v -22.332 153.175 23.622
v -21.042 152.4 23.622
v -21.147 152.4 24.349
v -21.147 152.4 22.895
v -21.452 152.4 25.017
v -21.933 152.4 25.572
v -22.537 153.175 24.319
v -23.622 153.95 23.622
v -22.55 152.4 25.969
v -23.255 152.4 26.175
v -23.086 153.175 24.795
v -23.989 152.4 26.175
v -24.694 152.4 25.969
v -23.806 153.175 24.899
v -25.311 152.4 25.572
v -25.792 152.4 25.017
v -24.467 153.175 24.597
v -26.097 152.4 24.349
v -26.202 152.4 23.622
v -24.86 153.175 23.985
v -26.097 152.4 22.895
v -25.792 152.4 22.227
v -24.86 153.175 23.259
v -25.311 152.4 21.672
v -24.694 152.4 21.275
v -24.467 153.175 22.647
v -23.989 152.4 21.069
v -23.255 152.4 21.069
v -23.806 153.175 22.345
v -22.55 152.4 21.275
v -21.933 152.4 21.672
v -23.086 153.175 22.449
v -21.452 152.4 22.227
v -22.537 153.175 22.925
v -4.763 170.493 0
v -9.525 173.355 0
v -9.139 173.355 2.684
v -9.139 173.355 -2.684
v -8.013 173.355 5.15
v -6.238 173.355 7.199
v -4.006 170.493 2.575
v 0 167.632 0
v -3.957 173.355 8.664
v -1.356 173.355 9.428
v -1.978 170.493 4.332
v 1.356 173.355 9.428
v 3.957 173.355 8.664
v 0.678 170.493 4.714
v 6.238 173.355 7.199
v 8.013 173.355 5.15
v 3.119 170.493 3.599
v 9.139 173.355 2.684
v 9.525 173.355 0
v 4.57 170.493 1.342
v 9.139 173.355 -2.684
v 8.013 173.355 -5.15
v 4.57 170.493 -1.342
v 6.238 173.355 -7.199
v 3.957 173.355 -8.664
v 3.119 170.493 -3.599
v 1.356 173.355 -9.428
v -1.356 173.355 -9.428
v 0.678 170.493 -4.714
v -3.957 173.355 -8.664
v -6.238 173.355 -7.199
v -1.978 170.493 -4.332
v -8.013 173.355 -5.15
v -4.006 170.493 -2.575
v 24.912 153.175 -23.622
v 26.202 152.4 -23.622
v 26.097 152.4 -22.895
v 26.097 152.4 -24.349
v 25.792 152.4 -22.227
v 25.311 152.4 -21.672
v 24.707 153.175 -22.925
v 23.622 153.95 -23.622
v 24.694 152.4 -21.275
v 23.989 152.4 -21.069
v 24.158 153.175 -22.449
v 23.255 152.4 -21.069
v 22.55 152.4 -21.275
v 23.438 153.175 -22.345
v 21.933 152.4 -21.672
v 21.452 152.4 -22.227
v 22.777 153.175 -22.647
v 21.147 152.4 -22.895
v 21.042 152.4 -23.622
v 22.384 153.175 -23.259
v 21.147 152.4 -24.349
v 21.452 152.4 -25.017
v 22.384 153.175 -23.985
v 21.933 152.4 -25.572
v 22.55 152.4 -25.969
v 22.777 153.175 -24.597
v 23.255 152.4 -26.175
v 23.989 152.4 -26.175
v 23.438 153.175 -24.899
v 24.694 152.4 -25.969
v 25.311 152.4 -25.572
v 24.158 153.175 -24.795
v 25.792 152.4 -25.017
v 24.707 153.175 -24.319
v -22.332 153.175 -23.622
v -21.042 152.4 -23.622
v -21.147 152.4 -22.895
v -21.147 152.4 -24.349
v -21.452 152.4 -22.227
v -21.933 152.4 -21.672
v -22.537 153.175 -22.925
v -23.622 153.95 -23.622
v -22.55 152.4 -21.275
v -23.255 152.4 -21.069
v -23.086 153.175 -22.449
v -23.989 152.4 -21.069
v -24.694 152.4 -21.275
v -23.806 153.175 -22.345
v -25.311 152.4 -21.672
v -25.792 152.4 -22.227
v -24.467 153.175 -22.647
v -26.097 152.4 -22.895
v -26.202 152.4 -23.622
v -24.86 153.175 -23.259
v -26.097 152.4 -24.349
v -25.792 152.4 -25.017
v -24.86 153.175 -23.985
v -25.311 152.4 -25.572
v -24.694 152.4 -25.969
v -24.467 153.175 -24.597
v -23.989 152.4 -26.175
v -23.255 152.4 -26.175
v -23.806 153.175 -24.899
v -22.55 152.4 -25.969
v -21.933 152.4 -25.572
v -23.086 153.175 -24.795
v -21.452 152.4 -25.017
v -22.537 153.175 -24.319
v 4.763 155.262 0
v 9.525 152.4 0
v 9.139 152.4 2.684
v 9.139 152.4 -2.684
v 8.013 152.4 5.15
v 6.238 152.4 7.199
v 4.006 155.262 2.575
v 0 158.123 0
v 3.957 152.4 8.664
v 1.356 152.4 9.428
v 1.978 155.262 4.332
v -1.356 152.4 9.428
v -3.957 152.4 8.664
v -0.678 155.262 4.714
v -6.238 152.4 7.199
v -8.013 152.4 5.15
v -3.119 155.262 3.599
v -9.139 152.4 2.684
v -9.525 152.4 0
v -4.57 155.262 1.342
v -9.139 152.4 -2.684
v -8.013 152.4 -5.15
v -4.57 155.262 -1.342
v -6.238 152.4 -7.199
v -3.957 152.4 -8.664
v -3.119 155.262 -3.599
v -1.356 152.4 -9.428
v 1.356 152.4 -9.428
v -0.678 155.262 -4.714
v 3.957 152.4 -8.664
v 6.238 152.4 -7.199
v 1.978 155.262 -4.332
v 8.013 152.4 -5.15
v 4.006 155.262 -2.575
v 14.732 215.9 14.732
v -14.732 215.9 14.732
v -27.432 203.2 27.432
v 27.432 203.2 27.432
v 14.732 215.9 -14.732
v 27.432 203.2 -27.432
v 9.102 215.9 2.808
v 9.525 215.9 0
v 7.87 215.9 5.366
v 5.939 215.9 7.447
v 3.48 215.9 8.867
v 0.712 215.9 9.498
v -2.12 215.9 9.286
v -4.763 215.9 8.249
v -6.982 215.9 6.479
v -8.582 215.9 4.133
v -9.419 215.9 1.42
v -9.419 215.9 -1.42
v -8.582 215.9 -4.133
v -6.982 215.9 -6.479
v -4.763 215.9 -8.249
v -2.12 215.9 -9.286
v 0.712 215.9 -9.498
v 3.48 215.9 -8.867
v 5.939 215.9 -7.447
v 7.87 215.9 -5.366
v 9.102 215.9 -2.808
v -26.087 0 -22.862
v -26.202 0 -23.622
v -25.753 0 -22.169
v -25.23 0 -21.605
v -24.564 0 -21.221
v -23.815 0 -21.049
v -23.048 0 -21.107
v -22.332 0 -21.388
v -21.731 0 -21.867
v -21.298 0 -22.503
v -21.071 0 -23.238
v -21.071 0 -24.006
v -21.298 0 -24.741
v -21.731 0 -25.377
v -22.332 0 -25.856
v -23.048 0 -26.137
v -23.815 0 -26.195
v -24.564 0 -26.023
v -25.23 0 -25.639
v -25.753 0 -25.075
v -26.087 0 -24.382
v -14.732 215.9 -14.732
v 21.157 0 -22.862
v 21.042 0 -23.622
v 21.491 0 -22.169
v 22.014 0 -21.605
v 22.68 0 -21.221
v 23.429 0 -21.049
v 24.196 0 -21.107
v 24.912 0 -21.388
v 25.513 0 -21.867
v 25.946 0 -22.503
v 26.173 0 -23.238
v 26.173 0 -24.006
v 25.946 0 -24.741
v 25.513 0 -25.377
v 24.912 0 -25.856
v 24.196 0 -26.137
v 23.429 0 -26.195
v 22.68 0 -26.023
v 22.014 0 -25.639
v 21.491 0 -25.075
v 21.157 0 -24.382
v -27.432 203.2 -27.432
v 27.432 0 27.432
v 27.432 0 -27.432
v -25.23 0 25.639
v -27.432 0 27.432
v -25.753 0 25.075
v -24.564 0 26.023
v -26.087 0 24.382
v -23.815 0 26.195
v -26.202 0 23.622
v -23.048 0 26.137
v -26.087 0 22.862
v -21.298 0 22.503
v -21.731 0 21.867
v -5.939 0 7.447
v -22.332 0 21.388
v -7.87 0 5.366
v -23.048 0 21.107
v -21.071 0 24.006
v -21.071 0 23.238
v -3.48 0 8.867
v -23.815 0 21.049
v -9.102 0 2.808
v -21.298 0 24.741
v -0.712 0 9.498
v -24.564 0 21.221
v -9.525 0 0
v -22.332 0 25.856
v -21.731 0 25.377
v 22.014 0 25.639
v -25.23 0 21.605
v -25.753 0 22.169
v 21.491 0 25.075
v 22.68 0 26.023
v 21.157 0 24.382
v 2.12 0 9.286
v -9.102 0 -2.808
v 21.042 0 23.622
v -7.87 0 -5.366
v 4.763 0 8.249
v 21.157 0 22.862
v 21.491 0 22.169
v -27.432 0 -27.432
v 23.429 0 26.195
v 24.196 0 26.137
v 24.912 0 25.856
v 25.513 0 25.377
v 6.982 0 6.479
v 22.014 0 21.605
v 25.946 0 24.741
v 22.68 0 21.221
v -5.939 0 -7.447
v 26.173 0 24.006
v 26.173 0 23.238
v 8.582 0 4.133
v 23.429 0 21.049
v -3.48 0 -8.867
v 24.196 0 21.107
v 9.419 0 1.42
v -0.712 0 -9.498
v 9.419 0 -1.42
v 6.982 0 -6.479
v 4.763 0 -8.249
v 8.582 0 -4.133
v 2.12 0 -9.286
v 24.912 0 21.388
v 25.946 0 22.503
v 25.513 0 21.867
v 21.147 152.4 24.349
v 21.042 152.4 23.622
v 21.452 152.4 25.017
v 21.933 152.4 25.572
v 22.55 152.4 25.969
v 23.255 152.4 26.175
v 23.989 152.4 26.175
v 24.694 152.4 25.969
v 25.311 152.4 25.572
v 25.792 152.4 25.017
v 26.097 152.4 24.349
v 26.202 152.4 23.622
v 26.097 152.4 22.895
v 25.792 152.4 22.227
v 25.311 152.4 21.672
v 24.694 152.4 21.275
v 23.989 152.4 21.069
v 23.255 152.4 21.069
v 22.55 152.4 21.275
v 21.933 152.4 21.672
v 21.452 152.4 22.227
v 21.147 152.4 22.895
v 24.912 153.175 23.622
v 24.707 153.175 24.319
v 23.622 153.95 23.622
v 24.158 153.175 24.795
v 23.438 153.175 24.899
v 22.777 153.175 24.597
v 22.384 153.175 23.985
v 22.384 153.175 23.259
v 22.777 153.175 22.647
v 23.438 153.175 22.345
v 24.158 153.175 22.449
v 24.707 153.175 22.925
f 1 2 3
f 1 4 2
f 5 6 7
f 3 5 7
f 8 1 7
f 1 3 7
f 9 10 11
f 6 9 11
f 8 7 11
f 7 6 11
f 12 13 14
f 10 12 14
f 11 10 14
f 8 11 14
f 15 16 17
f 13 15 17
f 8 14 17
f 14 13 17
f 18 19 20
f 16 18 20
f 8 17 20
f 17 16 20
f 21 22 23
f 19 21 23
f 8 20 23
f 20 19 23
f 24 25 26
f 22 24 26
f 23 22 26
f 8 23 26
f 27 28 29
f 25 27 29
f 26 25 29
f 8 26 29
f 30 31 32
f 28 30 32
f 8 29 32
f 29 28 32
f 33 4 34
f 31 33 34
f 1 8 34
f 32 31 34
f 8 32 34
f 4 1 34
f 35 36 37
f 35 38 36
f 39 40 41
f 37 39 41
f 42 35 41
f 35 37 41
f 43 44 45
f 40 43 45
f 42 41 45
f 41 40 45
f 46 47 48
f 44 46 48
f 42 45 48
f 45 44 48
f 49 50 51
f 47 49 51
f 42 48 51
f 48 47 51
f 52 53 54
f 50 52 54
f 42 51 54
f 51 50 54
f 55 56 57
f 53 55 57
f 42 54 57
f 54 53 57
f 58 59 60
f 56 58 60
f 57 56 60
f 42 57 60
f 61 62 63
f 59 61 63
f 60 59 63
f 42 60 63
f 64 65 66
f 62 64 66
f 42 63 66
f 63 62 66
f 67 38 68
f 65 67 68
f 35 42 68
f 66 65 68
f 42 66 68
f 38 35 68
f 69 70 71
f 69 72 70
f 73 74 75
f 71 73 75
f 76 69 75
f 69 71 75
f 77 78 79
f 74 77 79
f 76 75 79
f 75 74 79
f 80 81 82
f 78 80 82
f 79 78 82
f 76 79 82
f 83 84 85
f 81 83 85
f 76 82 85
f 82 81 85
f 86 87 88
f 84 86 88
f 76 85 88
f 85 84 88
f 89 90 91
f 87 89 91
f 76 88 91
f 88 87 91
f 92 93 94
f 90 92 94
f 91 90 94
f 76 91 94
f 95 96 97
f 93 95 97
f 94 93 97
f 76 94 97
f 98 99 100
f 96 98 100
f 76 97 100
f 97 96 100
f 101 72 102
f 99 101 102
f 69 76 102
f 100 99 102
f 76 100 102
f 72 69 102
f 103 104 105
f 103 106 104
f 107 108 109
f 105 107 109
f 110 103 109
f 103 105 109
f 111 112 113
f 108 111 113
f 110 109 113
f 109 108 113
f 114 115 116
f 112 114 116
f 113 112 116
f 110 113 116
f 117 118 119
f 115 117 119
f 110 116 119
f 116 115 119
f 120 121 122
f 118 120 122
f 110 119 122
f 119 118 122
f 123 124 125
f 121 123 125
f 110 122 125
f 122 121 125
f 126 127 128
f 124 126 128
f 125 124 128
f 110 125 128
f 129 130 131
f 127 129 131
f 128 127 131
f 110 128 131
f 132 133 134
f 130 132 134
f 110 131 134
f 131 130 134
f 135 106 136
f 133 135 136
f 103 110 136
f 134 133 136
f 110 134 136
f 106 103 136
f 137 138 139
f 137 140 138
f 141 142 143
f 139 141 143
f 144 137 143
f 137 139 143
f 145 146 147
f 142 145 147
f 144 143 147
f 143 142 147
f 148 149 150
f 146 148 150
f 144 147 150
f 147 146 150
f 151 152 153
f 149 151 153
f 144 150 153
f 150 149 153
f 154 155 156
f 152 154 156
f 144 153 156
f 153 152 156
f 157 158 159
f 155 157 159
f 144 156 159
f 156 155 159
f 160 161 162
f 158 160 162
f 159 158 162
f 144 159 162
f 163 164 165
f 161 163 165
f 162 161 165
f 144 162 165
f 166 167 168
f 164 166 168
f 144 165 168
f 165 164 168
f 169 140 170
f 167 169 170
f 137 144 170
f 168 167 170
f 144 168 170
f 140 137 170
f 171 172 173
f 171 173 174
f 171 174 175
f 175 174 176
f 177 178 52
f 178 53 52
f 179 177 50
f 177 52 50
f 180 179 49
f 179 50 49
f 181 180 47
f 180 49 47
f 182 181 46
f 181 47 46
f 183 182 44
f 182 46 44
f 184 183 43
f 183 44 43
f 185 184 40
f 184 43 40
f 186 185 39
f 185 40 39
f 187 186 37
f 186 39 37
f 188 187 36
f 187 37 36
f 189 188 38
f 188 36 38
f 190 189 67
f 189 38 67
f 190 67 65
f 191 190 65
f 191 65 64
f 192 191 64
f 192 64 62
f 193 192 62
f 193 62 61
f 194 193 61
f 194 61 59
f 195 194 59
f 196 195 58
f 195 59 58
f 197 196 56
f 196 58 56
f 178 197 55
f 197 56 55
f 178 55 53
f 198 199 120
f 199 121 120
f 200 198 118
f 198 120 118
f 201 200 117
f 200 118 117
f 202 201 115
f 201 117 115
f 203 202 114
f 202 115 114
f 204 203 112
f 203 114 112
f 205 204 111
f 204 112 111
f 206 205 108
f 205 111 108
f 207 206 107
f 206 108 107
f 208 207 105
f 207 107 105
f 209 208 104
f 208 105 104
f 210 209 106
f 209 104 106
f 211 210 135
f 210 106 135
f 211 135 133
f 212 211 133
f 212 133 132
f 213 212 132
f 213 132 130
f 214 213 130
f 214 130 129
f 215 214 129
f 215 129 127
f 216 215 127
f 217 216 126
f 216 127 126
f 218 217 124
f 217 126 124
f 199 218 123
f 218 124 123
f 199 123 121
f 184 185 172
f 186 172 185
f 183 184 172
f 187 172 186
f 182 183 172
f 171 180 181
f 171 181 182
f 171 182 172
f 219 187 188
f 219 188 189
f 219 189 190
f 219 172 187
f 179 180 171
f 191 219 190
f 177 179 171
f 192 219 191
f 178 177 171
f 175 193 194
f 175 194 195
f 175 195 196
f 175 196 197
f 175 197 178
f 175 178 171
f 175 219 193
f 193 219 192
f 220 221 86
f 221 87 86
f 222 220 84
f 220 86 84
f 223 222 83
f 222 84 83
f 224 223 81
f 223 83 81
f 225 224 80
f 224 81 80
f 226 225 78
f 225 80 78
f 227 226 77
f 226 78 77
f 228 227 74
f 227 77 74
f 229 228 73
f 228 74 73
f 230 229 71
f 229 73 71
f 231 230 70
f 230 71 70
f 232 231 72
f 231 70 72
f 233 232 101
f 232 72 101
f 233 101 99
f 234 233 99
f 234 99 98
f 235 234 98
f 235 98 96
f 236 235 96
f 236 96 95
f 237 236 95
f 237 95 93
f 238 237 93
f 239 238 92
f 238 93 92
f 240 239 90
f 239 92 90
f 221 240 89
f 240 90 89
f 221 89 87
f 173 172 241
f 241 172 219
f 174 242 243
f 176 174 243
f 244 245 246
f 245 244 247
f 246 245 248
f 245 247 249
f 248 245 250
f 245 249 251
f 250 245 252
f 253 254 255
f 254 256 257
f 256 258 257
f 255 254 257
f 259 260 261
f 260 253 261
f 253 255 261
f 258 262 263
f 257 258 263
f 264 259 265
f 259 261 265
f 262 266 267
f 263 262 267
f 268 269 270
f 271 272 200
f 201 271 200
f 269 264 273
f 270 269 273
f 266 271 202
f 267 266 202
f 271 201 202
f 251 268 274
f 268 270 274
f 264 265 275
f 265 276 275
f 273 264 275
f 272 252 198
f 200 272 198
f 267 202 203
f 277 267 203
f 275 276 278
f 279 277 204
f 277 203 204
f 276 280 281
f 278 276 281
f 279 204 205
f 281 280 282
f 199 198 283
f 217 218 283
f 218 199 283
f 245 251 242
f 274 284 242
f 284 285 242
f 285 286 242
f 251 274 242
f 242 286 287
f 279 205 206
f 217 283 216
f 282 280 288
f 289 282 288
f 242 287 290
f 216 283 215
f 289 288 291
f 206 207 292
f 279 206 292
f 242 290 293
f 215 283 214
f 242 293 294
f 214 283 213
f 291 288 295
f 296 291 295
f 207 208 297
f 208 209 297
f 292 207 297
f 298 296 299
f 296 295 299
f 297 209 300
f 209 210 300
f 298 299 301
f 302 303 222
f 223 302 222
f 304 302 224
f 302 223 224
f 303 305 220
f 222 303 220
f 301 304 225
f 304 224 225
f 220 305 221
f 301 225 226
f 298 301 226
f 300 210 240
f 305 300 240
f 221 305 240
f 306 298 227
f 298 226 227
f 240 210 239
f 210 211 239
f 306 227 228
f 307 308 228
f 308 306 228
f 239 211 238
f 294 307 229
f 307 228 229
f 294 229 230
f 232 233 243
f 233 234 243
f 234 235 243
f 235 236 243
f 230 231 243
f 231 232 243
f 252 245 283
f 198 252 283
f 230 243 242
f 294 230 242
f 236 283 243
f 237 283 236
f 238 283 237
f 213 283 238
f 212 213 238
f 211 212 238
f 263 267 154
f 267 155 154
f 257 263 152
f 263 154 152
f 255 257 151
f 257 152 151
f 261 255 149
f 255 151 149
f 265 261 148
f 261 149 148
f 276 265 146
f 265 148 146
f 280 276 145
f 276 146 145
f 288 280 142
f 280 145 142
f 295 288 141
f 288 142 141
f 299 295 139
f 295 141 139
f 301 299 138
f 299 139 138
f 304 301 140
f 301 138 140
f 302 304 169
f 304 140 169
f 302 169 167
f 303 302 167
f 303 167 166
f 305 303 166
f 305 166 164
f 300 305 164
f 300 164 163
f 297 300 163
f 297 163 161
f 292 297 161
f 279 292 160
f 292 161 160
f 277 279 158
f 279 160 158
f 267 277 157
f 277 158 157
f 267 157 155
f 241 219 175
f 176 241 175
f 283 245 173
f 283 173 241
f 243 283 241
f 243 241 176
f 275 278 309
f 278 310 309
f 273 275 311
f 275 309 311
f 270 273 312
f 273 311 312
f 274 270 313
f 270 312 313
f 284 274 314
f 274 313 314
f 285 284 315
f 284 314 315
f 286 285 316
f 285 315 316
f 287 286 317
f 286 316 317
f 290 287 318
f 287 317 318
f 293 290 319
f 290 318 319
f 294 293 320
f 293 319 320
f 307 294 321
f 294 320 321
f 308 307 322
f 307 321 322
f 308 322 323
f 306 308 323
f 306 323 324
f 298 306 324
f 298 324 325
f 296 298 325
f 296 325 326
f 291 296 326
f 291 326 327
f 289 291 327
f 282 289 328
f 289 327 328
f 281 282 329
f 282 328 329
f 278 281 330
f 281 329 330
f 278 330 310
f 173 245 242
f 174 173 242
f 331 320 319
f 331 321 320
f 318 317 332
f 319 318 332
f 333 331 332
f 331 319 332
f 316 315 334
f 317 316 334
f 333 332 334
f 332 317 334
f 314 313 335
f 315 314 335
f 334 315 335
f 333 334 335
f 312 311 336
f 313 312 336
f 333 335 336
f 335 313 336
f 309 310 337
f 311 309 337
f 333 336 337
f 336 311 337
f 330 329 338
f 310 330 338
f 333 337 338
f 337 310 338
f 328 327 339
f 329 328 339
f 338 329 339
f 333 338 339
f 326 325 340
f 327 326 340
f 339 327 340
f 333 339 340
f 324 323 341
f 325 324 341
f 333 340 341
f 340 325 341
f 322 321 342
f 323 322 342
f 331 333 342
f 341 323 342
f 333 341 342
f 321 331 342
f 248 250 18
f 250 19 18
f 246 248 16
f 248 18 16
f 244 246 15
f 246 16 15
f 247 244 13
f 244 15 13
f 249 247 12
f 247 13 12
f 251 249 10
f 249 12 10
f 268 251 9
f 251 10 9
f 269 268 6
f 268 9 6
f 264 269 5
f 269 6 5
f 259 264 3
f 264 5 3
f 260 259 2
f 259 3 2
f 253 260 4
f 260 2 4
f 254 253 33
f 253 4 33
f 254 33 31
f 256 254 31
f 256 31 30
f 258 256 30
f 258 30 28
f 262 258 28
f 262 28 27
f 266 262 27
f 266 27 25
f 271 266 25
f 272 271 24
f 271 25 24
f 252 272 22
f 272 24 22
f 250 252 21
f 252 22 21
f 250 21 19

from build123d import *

# Parameters (mm, degrees)
SKETCH1_W                            = 54.864
SKETCH1_H                            = 54.864
BOSS_EXTRUDE2_DEPTH                  = 215.9
F_3_4_0_75_DIAMETER_HOLE1_D          = 19.05
F_3_4_0_75_DIAMETER_HOLE1_DEPTH      = 152.4
F_3_4_0_75_DIAMETER_HOLE1_TIP        = 5.723197396
F_13_64_0_20313_DIAMETER_HOLE1_D     = 5.159502
F_13_64_0_20313_DIAMETER_HOLE1_DEPTH = 152.4
F_13_64_0_20313_DIAMETER_HOLE1_TIP   = 1.550070783
F_3_4_0_75_DIAMETER_HOLE2_D          = 19.05
F_3_4_0_75_DIAMETER_HOLE2_DEPTH      = 42.545
F_3_4_0_75_DIAMETER_HOLE2_TIP        = 5.723197396
CHAMFER1_SIZE                        = 12.7


with BuildPart() as part:
    # Sketch1 → Boss-Extrude2 (new body)
    with BuildSketch(Plane(origin=(0, 0, 0), x_dir=(1, 0, 0), z_dir=(0, 1, 0))):
        Rectangle(SKETCH1_W, SKETCH1_H)
    extrude(amount=BOSS_EXTRUDE2_DEPTH)

    # 3/4 (0.75) Diameter Hole1
    with Locations(Plane.XZ):
        with Locations((0, 0)):
            Hole(F_3_4_0_75_DIAMETER_HOLE1_D / 2, depth=F_3_4_0_75_DIAMETER_HOLE1_DEPTH)
            with Locations((0, 0, -(F_3_4_0_75_DIAMETER_HOLE1_DEPTH + F_3_4_0_75_DIAMETER_HOLE1_TIP / 2))):  # 118° drill point
                Cone(0, F_3_4_0_75_DIAMETER_HOLE1_D / 2, F_3_4_0_75_DIAMETER_HOLE1_TIP, mode=Mode.SUBTRACT)

    # 13/64 (0.20313) Diameter Hole1
    with Locations(Plane.XZ):
        with Locations((-23.622, 23.622), (23.622, 23.622), (23.622, -23.622), (-23.622, -23.622)):
            Hole(F_13_64_0_20313_DIAMETER_HOLE1_D / 2, depth=F_13_64_0_20313_DIAMETER_HOLE1_DEPTH)
            with Locations((0, 0, -(F_13_64_0_20313_DIAMETER_HOLE1_DEPTH + F_13_64_0_20313_DIAMETER_HOLE1_TIP / 2))):  # 118° drill point
                Cone(0, F_13_64_0_20313_DIAMETER_HOLE1_D / 2, F_13_64_0_20313_DIAMETER_HOLE1_TIP, mode=Mode.SUBTRACT)

    # 3/4 (0.75) Diameter Hole2
    with Locations(Plane(origin=(0, 215.9, 0), x_dir=(-1, 0, 0), z_dir=(0, 1, 0))):
        with Locations((0, 0)):
            Hole(F_3_4_0_75_DIAMETER_HOLE2_D / 2, depth=F_3_4_0_75_DIAMETER_HOLE2_DEPTH)
            with Locations((0, 0, -(F_3_4_0_75_DIAMETER_HOLE2_DEPTH + F_3_4_0_75_DIAMETER_HOLE2_TIP / 2))):  # 118° drill point
                Cone(0, F_3_4_0_75_DIAMETER_HOLE2_D / 2, F_3_4_0_75_DIAMETER_HOLE2_TIP, mode=Mode.SUBTRACT)

    # Chamfer1
    chamfer1_edges = [part.edges().sort_by_distance(p)[0] for p in [
        (0, 215.9, 27.432),
        (-27.432, 215.9, 0),
        (0, 215.9, -27.432),
        (27.432, 215.9, 0),
    ]]
    chamfer(chamfer1_edges, length=CHAMFER1_SIZE)


solid = part.part
